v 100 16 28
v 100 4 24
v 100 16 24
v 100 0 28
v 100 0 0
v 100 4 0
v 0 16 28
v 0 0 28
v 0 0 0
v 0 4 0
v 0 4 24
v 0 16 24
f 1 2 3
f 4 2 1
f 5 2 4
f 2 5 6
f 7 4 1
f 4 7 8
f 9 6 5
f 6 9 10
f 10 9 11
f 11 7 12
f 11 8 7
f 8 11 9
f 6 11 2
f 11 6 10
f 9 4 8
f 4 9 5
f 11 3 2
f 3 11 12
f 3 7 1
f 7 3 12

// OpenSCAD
// Original MechIntel educational model. CC0-1.0. Units: mm.
// Not a standardized or load-rated component.
$fn=96;
length=100;
depth=16;
height=28;
wall=4;
$fn=64;
difference(){union(){
translate([0,0,0]) cube([length,wall,height]);
translate([0,0,height-wall]) cube([length,depth,wall]);
}

}
